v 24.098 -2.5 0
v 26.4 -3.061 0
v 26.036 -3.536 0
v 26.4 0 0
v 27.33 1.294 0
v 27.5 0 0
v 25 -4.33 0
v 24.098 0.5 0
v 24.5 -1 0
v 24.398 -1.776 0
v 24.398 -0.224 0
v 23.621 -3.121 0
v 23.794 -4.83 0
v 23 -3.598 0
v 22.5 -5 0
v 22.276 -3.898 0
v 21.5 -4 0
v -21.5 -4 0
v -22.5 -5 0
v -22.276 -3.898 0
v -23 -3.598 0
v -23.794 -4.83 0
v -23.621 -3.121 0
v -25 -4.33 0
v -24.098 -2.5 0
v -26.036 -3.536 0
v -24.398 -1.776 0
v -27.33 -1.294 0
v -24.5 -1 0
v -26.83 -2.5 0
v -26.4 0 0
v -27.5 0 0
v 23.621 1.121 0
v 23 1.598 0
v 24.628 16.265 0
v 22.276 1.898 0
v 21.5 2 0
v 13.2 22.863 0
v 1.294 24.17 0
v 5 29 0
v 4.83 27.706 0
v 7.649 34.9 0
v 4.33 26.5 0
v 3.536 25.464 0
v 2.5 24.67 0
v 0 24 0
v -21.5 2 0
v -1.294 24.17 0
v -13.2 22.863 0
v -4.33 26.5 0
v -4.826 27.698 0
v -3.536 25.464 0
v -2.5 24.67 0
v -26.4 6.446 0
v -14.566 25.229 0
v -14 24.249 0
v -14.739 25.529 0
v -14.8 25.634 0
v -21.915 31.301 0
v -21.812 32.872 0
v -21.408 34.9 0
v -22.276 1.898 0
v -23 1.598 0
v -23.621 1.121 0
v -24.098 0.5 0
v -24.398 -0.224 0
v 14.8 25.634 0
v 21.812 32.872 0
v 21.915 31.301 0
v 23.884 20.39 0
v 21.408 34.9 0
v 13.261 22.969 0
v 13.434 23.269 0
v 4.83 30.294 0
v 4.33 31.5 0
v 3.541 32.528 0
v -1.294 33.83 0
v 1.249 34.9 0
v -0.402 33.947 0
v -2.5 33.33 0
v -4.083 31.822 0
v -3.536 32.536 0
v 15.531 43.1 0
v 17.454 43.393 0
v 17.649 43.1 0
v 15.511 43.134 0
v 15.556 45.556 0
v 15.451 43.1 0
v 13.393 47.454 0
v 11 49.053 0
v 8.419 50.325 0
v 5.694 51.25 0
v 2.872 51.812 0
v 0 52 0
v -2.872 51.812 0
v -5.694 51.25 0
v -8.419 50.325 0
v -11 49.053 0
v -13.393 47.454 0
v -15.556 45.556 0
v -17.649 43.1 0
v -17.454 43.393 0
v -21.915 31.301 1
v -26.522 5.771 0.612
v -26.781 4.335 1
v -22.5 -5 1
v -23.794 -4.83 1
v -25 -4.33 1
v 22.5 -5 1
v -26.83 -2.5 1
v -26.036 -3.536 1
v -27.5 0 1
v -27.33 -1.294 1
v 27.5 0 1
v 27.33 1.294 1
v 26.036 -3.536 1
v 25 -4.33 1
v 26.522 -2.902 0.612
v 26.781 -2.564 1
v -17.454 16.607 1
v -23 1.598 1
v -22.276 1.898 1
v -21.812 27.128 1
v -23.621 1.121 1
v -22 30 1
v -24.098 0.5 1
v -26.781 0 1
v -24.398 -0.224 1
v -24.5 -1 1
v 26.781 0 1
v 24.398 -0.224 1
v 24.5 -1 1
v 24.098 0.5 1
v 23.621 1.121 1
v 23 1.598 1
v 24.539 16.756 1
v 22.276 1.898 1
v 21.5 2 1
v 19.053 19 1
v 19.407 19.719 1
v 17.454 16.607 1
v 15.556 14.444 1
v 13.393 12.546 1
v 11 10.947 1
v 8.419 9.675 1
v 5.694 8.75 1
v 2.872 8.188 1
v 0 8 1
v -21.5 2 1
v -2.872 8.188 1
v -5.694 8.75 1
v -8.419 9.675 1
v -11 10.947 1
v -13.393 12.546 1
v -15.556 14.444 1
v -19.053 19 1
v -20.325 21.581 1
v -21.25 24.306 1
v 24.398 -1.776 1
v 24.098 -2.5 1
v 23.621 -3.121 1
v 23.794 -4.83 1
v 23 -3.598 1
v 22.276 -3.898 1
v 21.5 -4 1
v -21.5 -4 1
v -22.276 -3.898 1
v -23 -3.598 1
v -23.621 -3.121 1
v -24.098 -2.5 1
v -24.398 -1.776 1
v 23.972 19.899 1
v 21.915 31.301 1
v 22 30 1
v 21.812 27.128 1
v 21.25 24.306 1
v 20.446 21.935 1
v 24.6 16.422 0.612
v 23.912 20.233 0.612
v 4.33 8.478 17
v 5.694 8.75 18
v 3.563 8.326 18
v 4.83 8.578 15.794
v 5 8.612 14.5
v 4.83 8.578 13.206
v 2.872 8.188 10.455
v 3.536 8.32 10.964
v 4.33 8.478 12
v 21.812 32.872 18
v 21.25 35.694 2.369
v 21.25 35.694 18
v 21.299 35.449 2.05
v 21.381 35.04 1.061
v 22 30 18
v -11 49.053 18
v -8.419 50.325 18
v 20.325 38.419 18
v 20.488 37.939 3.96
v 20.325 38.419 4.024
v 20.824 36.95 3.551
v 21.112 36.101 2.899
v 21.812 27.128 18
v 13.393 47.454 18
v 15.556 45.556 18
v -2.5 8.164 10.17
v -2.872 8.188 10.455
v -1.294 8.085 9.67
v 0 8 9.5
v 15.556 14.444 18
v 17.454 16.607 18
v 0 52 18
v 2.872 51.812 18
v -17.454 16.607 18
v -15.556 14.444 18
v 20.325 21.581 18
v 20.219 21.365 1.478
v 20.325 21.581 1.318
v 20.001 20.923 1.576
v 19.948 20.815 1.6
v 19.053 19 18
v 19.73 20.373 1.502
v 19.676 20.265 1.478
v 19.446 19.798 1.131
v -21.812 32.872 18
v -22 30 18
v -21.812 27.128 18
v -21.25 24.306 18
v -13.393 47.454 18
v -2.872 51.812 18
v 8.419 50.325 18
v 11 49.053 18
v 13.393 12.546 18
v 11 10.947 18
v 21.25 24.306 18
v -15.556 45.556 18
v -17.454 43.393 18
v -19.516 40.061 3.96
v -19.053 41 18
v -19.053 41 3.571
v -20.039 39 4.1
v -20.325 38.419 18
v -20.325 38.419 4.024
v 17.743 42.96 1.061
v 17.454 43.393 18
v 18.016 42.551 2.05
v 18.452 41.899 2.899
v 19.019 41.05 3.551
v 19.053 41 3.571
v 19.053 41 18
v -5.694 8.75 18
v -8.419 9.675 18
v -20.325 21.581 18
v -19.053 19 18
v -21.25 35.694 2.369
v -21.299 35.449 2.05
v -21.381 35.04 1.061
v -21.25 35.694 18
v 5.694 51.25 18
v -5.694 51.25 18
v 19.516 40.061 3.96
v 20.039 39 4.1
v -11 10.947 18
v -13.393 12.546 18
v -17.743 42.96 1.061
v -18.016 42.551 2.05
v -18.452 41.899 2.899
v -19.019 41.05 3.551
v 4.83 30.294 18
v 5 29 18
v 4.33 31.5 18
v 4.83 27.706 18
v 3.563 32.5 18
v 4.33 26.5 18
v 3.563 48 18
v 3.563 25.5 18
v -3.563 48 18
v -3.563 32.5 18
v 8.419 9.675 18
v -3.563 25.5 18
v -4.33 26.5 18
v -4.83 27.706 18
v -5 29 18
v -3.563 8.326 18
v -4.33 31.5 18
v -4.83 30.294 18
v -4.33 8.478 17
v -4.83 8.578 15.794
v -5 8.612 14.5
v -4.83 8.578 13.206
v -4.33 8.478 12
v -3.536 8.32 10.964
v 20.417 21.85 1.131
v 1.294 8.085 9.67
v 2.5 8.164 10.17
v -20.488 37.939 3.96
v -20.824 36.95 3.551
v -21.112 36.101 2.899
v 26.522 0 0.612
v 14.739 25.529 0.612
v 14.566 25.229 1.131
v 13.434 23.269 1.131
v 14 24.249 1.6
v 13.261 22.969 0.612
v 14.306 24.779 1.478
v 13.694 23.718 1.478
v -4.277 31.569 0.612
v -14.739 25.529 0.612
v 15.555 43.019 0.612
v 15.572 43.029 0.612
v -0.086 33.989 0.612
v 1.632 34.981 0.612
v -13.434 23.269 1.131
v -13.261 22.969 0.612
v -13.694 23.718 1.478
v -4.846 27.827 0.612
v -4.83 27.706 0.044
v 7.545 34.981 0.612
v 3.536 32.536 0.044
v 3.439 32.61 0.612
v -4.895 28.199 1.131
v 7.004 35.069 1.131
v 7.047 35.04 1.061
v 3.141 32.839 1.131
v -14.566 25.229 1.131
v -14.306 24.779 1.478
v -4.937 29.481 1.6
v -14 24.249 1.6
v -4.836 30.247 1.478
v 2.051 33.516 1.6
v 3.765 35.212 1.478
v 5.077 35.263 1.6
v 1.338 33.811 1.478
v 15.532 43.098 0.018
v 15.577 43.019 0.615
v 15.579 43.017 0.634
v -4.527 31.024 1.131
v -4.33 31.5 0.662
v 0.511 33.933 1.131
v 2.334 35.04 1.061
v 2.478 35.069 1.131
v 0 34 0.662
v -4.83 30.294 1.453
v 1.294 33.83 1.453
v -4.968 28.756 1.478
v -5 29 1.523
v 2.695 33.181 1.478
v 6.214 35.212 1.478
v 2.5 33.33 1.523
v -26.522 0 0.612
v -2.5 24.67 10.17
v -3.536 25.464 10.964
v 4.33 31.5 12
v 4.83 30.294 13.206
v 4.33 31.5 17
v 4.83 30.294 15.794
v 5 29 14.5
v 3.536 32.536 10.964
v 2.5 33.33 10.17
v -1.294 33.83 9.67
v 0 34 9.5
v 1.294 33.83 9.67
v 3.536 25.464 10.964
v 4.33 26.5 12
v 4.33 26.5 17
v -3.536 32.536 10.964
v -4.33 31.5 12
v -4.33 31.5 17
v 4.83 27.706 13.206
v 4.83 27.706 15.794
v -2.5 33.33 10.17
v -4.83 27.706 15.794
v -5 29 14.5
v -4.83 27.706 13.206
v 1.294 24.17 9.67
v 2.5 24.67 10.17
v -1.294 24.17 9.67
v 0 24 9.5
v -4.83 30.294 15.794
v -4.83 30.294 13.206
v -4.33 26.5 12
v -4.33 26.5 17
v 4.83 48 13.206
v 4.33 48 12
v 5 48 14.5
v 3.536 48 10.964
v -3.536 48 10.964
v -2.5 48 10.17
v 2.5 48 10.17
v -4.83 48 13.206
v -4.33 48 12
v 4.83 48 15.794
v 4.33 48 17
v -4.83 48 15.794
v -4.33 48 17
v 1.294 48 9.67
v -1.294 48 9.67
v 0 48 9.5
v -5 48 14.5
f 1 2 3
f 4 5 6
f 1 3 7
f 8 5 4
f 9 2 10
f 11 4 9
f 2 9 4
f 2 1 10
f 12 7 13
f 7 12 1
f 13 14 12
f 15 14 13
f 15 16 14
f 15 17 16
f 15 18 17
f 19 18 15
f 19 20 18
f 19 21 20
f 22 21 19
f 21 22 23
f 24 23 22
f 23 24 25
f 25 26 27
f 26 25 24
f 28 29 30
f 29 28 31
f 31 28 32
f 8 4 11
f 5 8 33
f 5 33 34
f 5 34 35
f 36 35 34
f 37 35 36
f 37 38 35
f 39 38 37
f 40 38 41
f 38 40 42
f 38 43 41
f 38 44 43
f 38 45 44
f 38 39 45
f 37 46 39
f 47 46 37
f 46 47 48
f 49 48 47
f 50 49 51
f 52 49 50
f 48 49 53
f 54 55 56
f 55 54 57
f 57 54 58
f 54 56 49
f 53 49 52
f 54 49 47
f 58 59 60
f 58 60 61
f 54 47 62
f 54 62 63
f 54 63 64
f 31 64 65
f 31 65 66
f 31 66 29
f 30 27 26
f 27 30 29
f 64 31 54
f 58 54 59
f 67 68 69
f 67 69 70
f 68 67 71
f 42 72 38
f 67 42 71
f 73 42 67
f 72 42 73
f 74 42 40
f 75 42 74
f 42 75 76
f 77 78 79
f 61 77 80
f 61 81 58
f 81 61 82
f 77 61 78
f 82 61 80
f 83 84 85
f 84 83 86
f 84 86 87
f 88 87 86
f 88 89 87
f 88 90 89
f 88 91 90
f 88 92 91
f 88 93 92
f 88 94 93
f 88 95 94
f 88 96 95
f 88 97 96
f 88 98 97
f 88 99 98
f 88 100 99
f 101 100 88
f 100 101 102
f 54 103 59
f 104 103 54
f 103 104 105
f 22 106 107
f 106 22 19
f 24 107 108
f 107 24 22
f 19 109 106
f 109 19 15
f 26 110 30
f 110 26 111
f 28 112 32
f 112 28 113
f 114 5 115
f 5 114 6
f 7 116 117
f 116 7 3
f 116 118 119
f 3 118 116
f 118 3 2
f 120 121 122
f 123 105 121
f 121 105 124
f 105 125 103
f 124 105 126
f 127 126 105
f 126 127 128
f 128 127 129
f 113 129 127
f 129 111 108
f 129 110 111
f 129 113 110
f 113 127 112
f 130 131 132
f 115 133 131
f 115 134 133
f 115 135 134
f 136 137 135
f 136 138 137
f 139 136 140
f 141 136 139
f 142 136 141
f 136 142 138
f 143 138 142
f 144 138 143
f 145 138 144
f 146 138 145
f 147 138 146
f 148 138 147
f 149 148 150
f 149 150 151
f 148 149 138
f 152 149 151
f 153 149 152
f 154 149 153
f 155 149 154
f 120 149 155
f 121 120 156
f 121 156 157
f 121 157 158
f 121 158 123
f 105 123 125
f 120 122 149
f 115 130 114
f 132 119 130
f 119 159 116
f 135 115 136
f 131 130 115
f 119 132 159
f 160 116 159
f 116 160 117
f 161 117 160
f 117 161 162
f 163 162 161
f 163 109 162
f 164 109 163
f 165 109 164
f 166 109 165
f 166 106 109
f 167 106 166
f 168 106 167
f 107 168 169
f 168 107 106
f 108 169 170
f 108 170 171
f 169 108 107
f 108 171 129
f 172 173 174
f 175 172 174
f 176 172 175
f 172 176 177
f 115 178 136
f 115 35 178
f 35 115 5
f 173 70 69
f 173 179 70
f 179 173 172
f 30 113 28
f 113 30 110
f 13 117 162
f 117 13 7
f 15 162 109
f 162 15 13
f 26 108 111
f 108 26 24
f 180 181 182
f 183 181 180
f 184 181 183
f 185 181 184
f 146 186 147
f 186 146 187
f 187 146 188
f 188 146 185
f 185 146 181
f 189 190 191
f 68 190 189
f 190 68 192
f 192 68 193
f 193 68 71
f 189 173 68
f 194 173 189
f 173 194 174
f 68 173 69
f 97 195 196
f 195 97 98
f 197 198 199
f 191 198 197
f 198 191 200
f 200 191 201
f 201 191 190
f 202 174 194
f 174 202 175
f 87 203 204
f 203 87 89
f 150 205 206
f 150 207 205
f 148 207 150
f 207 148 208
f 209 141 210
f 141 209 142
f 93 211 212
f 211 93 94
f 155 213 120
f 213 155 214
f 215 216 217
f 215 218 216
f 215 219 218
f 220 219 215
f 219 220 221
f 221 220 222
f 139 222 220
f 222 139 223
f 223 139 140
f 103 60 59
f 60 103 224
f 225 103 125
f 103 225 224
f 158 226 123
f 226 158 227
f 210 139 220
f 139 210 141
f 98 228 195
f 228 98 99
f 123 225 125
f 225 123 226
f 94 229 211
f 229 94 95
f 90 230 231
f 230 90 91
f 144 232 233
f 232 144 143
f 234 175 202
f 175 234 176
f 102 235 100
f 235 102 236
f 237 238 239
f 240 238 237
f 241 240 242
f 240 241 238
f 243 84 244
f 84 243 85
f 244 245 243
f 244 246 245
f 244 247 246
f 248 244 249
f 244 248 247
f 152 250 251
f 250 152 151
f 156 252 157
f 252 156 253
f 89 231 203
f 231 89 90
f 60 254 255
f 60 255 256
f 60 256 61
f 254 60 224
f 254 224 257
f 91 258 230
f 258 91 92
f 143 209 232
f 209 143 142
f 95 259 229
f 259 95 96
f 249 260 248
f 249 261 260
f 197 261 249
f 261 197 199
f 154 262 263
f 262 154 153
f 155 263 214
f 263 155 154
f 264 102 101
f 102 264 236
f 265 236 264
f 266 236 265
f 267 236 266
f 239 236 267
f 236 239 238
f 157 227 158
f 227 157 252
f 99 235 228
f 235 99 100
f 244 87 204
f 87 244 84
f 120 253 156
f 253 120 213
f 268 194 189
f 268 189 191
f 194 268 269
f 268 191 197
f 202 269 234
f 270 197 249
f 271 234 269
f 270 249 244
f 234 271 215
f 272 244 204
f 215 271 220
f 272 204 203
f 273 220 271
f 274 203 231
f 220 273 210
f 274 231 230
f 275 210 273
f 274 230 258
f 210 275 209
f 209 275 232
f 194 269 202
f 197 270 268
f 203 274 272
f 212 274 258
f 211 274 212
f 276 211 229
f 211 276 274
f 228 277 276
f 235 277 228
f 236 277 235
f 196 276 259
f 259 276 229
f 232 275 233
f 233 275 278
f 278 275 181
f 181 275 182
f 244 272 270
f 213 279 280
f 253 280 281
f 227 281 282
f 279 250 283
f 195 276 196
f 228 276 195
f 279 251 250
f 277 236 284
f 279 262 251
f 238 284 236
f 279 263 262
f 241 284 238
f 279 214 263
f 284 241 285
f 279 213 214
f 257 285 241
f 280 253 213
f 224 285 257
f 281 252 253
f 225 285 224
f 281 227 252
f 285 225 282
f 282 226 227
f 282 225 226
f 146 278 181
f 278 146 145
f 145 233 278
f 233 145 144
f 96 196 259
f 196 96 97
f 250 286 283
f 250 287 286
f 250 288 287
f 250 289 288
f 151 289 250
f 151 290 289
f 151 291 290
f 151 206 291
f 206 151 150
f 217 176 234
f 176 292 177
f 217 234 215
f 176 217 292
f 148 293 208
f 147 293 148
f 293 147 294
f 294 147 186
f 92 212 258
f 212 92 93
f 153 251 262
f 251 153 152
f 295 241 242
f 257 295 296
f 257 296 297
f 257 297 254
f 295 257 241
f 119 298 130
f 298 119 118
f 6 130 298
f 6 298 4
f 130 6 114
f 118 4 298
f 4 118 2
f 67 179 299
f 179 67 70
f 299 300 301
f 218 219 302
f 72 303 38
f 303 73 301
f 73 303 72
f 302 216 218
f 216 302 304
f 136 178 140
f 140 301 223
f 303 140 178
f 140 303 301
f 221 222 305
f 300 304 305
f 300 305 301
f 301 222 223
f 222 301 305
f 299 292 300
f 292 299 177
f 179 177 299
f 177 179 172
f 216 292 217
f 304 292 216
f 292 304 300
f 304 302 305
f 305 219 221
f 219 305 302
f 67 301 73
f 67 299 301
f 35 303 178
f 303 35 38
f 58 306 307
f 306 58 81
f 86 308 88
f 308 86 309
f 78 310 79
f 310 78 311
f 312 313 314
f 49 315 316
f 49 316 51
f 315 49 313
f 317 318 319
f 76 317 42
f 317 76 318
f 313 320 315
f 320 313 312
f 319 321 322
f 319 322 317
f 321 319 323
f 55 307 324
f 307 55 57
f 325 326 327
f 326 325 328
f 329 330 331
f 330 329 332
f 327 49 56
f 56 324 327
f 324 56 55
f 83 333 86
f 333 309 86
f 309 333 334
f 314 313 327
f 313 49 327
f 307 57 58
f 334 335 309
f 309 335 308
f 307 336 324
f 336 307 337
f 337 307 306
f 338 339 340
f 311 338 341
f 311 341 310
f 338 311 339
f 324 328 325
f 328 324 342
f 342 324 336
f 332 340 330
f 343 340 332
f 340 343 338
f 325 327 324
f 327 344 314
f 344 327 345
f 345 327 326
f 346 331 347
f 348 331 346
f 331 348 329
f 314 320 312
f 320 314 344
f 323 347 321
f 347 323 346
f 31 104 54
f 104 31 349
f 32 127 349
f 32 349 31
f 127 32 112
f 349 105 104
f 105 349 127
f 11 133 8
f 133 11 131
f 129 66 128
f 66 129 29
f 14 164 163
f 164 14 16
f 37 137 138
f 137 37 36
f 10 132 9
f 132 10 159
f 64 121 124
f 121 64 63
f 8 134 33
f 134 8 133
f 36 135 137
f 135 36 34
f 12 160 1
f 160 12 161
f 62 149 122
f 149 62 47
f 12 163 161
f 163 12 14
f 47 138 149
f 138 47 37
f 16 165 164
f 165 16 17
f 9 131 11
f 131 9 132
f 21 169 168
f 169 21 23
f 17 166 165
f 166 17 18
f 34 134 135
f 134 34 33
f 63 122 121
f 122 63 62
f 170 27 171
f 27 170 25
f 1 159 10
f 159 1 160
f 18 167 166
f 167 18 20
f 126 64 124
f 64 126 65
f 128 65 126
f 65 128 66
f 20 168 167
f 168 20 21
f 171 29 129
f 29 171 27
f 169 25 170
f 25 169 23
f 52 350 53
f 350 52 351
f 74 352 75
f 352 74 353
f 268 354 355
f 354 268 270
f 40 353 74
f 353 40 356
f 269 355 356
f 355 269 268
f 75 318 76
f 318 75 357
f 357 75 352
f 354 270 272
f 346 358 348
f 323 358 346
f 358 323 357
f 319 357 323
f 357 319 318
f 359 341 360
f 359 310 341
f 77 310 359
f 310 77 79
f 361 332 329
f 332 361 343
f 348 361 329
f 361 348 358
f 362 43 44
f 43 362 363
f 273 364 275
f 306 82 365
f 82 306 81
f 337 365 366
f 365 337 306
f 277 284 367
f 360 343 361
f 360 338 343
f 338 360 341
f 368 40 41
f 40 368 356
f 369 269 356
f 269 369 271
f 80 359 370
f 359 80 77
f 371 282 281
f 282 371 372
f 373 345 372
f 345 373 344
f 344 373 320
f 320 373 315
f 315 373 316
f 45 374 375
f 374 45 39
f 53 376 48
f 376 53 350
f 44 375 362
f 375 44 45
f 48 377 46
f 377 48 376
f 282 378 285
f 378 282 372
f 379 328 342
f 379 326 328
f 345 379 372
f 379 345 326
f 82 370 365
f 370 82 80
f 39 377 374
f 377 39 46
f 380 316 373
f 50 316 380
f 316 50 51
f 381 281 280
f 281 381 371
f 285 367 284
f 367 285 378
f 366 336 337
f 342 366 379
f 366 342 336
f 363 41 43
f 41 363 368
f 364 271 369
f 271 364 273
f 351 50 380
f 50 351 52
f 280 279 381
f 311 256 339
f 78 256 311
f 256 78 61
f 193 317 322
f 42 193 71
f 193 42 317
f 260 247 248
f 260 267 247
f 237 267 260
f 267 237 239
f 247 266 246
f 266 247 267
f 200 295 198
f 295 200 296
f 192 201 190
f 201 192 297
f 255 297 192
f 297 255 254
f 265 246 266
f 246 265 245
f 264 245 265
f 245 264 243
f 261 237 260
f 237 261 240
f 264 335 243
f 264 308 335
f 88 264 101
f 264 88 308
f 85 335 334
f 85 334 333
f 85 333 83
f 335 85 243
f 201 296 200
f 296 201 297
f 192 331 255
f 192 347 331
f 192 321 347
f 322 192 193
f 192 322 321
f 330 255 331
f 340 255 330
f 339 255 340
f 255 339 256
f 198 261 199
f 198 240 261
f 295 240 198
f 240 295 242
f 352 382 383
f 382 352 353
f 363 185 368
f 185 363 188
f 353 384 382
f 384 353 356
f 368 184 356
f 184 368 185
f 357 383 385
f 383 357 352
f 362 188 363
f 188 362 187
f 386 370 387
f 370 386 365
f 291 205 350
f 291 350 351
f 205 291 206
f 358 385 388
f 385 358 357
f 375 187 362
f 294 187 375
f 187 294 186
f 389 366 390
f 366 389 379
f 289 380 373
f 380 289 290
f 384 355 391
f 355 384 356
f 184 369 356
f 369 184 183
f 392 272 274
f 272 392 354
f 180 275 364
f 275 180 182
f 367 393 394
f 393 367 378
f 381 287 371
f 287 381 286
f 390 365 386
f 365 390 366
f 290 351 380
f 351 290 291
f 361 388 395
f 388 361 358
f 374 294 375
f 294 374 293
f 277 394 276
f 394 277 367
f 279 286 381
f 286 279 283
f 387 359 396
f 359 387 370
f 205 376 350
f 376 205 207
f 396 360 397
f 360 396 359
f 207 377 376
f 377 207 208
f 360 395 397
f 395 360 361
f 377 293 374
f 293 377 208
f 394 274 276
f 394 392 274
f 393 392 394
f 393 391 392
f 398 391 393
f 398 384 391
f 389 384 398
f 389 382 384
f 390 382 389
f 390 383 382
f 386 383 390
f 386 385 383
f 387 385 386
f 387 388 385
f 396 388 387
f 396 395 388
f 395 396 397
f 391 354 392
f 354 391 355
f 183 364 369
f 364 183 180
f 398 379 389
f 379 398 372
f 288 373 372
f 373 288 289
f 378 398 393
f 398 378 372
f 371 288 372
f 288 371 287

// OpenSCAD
// ============================================================
//  body_to_j1_flange.scad
//  Verbindungsflansch: Haifisch-Körper → Schwanzsegment J1
//
//  Zweck:
//    Schnittstelle zwischen dem importierten Hai-Körper (Fusion 360)
//    und dem ersten aktiven Gelenk-Flansch J1 (tail_link_j1.stl).
//
//  Workflow Fusion 360:
//    1. Dieses SCAD als STL exportieren (OpenSCAD → F6 → Export)
//    2. In Fusion 360: Insert → Insert Mesh → body_to_j1_flange.stl
//    3. Mit dem Hai-Körper (nach Shell) an der Schnittfläche ausrichten
//    4. Combine → Join
//    5. Gesamtes Modell als STEP exportieren (für Dreherei/Dokumentation)
//
//  Koordinatensystem:
//    +X = Schwanzrichtung (hinten)
//    -X = Kopfrichtung (vorne)
//    Z  = vertikal (oben)
// ============================================================

// ── Parameter ────────────────────────────────────────────────

// Körper-Querschnitt an der Schnittstelle (Hai-Rumpf, ~60% Länge)
body_w      = 55;    // mm Breite des Rumpfs an Schnittstelle
body_h      = 45;    // mm Höhe des Rumpfs an Schnittstelle
body_wall   = 3;     // mm Wandstärke Rumpf (aus Fusion 360 Shell)

// Flansch-Geometrie
flange_len  = 30;    // mm Länge des Übergangsstücks
flange_r    = 22;    // mm Aussenradius zylindrischer Zapfen (für J1)
j1_bore_r   = 4.1;  // mm Innenbohrung für M8-Achse (Gelenk J1)
j1_w        = 65;    // mm Breite J1-Flansch (aus tail_link_j1.stl)
j1_h        = 40;    // mm Höhe J1-Flansch

// Kabeldurchführung
cable_r     = 5;     // mm Radius Kabelkanal (ESP32-Kabel durch Gelenk)

// Schraubenlöcher (Flansch → Körper, M3)
screw_r     = 1.6;   // mm
screw_ring  = 28;    // mm Teilkreisradius der M3-Schrauben

// Fase / Übergang
fase        = 2.0;

// ── Hauptkörper ──────────────────────────────────────────────
module body_querschnitt(w, h, r=5) {
    // Abgerundetes Rechteck (Rumpf-Querschnitt)
    hull() {
        for (x = [-w/2+r, w/2-r])
        for (z = [-h/2+r, h/2-r])
            translate([x, 0, z]) circle(r=r, $fn=24);
    }
}

module flansch() {
    difference() {
        union() {
            // ① Übergangs-Extrusion: Rumpf-Querschnitt → Zylinder
            //    Linearer Übergang über flange_len
            hull() {
                // Rumpf-Seite (vorne, -Y)
                translate([0, 0, 0])
                    linear_extrude(height=1)
                        body_querschnitt(body_w, body_h);

                // Zapfen-Seite (hinten, +Y)
                translate([0, flange_len-1, 0])
                    linear_extrude(height=1)
                        circle(r=flange_r, $fn=48);
            }

            // ② Zylindrischer Zapfen für J1-Aufnahme
            translate([0, flange_len, 0])
                cylinder(h=18, r=flange_r, $fn=48);
        }

        // ── Subtraktionen ────────────────────────────────────

        // Innenhohlraum (Wandstärke body_wall)
        translate([0, -1, 0])
            linear_extrude(height=flange_len+2)
                body_querschnitt(body_w - 2*body_wall,
                                 body_h - 2*body_wall, r=3);

        // Zapfen-Innenbohrung (Kabelkanal + Achsbohrung)
        translate([0, flange_len-1, 0])
            cylinder(h=22, r=cable_r, $fn=24);

        // M8-Achsen-Bohrung für J1 (quer, X-Richtung)
        translate([0, flange_len+9, 0])
            rotate([0, 90, 0])
                cylinder(h=flange_r*3, r=j1_bore_r, $fn=24, center=true);

        // M3-Schrauben-Kranz (Flansch → Körper, 6× gleichmäßig)
        for (i = [0:5])
            rotate([0, 0, i*60])
                translate([screw_ring, 0, 0])
                    rotate([90, 0, 0])
                        cylinder(h=flange_len+5, r=screw_r, $fn=16);

        // Kabelkanal längs (ESP32-Kabel, Ø10mm)
        translate([0, -2, body_h/2 - body_wall - cable_r])
            rotate([-90, 0, 0])
                cylinder(h=flange_len+20, r=cable_r, $fn=24);
    }
}

// ── Render ───────────────────────────────────────────────────
flansch();

// ── Info ─────────────────────────────────────────────────────
echo("=== body_to_j1_flange.scad ===");
echo(str("Rumpf-Querschnitt: ", body_w, "×", body_h, "mm"));
echo(str("Zapfen-Radius:     ", flange_r, "mm (passt zu tail_link_j1.stl)"));
echo(str("M8-Achsbohrung:    Ø", j1_bore_r*2, "mm (quer, für Gelenk J1)"));
echo(str("Kabelkanal:        Ø", cable_r*2, "mm längs + quer"));
echo(str("M3-Schrauben:      6× auf Ø", screw_ring*2, "mm Teilkreis"));
echo("");
echo("Fusion 360 Workflow:");
echo("  1. OpenSCAD: F6 → Export als STL");
echo("  2. Fusion: Insert → Insert Mesh → body_to_j1_flange.stl");
echo("  3. Hai-Körper (nach Shell) an -Y-Fläche ausrichten");
echo("  4. Modify → Combine → Join");
echo("  5. File → Export → STEP (.step)");
